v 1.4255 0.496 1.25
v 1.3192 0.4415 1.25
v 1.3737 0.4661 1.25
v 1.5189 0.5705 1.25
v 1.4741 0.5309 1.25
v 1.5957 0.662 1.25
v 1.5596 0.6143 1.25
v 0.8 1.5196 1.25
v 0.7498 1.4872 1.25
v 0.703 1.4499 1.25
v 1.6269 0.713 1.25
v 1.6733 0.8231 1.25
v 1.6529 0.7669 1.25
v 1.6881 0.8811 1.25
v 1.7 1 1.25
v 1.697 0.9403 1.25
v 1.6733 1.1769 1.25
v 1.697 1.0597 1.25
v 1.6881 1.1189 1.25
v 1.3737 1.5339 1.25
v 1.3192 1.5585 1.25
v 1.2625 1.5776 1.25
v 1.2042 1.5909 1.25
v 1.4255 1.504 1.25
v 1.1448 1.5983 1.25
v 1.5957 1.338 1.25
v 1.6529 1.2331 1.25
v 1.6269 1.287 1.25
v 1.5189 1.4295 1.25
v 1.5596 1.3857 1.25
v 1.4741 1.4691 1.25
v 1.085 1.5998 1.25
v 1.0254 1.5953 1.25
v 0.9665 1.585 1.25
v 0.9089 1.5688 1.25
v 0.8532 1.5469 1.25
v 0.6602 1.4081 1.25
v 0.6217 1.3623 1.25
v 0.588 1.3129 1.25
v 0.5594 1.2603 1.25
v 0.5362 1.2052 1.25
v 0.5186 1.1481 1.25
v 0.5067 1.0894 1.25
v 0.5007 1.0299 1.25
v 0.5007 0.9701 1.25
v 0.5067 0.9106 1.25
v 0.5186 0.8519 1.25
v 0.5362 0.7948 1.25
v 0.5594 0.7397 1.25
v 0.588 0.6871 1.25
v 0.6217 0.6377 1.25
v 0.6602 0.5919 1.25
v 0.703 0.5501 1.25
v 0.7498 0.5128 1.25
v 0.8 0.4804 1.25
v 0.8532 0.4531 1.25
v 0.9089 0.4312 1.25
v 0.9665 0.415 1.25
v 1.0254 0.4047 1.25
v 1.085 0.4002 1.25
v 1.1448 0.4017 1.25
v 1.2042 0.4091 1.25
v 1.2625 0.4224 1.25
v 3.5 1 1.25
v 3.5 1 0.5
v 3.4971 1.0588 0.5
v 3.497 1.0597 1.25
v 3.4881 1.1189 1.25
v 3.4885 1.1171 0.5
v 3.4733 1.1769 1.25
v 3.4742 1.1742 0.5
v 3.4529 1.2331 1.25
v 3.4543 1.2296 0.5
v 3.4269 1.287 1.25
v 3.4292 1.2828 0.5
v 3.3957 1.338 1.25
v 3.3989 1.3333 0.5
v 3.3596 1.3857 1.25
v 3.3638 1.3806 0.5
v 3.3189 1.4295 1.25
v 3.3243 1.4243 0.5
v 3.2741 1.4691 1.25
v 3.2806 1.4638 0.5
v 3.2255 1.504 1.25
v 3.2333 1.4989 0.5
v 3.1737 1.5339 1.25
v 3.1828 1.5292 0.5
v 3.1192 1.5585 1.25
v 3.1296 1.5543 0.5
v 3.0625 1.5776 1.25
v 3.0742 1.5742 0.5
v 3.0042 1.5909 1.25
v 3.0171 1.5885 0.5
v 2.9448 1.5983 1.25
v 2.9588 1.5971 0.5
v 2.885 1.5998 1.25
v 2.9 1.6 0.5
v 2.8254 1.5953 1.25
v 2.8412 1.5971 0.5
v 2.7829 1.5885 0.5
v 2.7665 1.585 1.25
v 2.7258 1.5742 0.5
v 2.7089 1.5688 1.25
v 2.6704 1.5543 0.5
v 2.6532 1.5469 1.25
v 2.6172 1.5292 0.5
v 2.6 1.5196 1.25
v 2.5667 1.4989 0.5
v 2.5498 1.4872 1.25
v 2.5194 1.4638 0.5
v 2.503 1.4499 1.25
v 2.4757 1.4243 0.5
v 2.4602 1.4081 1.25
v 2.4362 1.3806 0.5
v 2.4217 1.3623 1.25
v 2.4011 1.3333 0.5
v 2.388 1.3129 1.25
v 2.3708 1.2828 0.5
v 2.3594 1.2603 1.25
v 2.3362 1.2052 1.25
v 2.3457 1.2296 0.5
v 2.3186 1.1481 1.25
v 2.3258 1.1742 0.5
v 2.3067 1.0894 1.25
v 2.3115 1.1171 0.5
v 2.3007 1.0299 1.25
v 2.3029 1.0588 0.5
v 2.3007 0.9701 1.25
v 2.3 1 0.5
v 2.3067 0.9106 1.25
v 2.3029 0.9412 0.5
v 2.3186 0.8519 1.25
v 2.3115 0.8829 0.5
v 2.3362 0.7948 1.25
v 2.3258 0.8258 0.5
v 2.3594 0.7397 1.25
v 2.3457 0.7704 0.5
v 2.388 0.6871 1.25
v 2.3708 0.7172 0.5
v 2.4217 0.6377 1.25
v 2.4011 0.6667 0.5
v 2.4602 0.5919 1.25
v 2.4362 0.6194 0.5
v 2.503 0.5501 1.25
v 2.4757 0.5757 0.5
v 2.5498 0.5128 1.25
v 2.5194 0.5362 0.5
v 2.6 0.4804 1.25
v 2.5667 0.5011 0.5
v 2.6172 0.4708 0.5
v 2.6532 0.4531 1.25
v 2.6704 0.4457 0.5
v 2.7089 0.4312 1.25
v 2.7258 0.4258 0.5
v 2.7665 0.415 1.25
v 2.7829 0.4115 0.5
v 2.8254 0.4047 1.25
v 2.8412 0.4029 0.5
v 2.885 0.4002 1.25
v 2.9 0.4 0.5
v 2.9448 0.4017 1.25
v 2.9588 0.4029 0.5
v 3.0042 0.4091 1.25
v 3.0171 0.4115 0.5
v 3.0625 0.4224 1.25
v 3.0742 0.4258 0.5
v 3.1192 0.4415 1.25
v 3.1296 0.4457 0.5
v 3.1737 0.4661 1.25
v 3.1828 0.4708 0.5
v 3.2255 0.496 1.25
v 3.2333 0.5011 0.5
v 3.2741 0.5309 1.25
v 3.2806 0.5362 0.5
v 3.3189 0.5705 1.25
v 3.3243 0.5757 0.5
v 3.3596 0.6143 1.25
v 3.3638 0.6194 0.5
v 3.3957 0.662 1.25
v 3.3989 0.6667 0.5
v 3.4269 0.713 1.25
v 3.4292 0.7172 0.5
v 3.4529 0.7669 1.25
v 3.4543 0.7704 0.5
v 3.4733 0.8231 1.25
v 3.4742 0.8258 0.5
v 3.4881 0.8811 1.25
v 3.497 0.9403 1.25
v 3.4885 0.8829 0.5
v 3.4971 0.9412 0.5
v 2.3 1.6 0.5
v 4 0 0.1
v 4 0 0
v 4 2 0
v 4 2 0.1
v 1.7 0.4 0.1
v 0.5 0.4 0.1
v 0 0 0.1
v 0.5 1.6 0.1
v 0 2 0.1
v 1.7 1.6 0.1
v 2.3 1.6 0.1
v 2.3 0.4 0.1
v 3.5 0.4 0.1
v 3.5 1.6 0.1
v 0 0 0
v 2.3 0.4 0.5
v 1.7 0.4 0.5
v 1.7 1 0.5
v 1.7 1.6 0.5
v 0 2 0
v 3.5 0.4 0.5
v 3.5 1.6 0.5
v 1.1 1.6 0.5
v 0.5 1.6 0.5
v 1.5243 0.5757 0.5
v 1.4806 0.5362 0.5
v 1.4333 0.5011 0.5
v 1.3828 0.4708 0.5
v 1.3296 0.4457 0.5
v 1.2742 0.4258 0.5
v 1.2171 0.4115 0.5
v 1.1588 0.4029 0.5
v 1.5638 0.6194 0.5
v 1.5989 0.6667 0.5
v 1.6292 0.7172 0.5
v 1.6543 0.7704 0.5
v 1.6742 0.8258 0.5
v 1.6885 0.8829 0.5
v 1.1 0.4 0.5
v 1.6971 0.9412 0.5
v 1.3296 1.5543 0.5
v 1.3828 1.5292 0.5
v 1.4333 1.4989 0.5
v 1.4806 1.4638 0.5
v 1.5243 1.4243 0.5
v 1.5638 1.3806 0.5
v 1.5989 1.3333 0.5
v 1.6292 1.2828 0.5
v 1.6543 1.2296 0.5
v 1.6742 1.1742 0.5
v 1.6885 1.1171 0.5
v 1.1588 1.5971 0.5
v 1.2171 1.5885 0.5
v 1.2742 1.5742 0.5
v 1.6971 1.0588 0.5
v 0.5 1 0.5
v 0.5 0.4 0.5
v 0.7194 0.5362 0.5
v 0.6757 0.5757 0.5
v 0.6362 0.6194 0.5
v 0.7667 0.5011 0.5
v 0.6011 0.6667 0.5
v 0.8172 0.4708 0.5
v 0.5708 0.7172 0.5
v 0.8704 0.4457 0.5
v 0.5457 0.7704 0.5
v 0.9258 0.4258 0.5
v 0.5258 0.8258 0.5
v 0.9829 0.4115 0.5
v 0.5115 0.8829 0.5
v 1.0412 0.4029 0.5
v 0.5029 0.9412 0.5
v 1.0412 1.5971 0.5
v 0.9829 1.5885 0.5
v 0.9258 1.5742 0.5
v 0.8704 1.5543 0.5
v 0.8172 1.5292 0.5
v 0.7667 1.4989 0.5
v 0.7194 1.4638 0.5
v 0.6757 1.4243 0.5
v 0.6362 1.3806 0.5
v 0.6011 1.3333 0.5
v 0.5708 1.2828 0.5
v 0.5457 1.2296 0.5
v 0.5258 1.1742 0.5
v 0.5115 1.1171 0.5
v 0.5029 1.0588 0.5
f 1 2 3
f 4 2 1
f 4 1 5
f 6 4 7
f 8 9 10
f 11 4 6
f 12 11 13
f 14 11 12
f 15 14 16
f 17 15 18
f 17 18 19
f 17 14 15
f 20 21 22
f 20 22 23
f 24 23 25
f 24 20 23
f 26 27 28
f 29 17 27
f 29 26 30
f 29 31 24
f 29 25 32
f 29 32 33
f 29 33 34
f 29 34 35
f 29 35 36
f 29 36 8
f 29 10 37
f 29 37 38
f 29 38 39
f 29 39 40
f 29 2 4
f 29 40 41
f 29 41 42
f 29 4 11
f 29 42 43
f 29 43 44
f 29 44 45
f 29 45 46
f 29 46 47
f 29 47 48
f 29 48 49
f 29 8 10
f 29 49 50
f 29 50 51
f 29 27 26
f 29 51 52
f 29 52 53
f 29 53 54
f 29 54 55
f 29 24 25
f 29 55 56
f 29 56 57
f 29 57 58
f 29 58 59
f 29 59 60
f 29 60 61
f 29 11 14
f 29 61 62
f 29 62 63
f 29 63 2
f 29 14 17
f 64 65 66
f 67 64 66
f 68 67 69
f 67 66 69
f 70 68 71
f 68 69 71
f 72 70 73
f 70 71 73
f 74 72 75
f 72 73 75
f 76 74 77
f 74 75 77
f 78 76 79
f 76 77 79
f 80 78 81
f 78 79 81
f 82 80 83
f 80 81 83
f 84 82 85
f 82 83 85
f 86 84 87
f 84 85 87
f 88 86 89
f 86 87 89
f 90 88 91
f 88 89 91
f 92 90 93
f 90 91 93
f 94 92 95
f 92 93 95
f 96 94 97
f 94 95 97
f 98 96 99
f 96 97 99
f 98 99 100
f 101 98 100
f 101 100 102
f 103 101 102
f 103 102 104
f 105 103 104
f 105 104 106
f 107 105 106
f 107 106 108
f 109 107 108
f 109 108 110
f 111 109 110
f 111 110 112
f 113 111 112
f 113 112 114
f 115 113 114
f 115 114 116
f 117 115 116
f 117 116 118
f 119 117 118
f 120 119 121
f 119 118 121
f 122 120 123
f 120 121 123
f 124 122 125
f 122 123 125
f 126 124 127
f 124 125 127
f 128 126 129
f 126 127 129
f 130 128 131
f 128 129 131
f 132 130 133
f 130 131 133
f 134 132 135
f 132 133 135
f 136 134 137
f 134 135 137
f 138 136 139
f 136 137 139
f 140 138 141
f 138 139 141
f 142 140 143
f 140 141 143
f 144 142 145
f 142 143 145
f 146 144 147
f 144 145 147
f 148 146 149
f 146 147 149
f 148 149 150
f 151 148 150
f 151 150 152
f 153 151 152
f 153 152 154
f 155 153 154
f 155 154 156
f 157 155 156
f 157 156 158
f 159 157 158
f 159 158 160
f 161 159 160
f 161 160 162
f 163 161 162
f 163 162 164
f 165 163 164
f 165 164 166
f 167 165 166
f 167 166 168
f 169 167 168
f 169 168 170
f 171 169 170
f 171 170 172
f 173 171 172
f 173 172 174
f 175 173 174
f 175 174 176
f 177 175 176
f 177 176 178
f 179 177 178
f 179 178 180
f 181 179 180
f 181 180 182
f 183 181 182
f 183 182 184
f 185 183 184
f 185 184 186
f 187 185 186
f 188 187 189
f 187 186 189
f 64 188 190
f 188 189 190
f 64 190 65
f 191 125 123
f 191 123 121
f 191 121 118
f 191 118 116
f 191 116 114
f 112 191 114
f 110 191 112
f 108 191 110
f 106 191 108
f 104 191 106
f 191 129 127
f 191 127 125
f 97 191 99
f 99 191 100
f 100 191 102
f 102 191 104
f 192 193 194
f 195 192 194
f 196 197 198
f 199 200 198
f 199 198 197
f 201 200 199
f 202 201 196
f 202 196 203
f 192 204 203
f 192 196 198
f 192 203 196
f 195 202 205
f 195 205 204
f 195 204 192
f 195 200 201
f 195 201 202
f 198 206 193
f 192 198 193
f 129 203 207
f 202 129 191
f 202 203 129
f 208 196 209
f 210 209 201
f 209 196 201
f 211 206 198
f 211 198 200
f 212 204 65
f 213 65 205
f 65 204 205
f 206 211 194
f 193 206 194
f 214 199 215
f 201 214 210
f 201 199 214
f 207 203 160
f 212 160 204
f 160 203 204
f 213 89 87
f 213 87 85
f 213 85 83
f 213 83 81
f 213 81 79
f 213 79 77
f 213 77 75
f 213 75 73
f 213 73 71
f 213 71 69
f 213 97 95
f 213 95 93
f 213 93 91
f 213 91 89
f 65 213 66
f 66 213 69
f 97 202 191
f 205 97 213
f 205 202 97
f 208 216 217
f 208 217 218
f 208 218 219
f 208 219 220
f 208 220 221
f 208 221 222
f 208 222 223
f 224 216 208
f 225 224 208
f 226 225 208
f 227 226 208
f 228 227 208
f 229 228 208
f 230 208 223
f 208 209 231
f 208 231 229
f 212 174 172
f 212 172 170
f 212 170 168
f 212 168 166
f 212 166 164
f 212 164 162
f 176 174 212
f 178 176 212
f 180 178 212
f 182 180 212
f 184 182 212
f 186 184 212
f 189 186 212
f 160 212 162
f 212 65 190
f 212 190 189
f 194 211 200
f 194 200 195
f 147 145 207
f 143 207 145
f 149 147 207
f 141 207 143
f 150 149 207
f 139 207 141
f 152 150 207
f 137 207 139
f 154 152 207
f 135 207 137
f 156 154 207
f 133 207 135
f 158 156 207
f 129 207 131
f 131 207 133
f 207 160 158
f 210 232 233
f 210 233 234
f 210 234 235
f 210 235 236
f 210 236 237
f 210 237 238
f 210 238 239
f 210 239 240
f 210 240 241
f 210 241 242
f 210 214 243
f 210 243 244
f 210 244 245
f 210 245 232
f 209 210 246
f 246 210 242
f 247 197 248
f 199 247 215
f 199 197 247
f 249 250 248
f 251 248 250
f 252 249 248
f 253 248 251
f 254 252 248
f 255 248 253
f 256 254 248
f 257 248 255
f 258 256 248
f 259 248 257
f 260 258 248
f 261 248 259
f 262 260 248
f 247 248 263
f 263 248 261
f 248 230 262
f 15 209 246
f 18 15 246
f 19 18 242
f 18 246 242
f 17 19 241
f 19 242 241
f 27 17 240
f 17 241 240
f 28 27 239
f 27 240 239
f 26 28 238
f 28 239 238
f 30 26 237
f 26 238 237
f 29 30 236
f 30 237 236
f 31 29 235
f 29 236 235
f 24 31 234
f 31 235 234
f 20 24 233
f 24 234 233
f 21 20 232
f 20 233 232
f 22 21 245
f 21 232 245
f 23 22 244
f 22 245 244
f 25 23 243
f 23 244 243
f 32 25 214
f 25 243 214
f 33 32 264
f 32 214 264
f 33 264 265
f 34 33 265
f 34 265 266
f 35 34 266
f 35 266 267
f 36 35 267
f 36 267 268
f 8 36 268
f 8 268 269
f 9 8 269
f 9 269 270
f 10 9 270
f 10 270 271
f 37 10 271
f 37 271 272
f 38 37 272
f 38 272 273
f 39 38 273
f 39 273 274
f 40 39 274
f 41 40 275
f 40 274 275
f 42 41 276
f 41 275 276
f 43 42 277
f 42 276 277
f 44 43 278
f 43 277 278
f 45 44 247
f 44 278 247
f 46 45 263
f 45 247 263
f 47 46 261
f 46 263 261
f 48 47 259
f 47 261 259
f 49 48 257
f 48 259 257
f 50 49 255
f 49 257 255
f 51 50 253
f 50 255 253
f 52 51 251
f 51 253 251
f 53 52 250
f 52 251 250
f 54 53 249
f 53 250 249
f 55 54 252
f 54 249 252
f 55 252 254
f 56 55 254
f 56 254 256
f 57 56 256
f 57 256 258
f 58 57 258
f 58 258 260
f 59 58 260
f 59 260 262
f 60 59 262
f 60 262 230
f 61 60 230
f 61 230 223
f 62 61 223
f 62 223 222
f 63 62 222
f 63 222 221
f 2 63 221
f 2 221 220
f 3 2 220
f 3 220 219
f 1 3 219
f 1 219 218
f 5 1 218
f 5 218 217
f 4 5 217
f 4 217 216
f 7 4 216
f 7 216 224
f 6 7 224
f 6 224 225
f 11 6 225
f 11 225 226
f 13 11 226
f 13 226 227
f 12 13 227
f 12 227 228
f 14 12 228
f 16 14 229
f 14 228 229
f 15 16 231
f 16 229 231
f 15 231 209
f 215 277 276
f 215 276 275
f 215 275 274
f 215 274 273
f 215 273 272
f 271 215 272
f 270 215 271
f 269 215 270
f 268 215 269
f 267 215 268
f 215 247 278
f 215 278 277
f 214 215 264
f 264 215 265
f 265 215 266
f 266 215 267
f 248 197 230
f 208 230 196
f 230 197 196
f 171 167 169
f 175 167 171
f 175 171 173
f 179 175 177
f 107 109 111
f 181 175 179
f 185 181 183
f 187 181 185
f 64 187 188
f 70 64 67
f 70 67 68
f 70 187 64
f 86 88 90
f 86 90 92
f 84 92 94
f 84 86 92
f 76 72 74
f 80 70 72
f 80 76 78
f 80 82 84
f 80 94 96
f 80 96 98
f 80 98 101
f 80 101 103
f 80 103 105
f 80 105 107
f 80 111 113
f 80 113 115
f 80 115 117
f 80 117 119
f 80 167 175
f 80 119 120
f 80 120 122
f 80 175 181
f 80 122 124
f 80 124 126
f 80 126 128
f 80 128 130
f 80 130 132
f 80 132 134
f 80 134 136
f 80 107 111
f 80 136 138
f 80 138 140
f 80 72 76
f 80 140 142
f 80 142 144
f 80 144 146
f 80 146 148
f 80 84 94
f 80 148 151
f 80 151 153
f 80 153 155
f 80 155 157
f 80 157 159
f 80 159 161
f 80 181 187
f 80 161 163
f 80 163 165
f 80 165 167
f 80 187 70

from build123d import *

# Parameters (mm, degrees)
ESQUISSE_1_W       = 4
ESQUISSE_1_H       = 2
BOSS_EXTRU_2_DEPTH = 0.1
ESQUISSE_2_W       = 1.2
ESQUISSE_2_H       = 1.2
BOSS_EXTRU_3_DEPTH = 0.5
ESQUISSE_3_R       = 0.6
BOSS_EXTRU_4_DEPTH = 1.25


with BuildPart() as part:
    # Esquisse 1 → Boss.-Extru.2 (new body)
    with BuildSketch(Plane.XY):
        with Locations((2, 1)):
            Rectangle(ESQUISSE_1_W, ESQUISSE_1_H)
    extrude(amount=BOSS_EXTRU_2_DEPTH)

    # Esquisse 2 → Boss.-Extru.3 (add)
    with BuildSketch(Plane.XY):
        with Locations((1.1, 1)):
            Rectangle(ESQUISSE_2_W, ESQUISSE_2_H)
        with Locations((2.9, 1)):
            Rectangle(ESQUISSE_2_W, ESQUISSE_2_H)
    extrude(amount=BOSS_EXTRU_3_DEPTH)

    # Esquisse 3 → Boss.-Extru.4 (add)
    with BuildSketch(Plane.XY):
        with Locations((1.1, 1)):
            Circle(ESQUISSE_3_R)
        with Locations((2.9, 1)):
            Circle(ESQUISSE_3_R)
    extrude(amount=BOSS_EXTRU_4_DEPTH)


solid = part.part
